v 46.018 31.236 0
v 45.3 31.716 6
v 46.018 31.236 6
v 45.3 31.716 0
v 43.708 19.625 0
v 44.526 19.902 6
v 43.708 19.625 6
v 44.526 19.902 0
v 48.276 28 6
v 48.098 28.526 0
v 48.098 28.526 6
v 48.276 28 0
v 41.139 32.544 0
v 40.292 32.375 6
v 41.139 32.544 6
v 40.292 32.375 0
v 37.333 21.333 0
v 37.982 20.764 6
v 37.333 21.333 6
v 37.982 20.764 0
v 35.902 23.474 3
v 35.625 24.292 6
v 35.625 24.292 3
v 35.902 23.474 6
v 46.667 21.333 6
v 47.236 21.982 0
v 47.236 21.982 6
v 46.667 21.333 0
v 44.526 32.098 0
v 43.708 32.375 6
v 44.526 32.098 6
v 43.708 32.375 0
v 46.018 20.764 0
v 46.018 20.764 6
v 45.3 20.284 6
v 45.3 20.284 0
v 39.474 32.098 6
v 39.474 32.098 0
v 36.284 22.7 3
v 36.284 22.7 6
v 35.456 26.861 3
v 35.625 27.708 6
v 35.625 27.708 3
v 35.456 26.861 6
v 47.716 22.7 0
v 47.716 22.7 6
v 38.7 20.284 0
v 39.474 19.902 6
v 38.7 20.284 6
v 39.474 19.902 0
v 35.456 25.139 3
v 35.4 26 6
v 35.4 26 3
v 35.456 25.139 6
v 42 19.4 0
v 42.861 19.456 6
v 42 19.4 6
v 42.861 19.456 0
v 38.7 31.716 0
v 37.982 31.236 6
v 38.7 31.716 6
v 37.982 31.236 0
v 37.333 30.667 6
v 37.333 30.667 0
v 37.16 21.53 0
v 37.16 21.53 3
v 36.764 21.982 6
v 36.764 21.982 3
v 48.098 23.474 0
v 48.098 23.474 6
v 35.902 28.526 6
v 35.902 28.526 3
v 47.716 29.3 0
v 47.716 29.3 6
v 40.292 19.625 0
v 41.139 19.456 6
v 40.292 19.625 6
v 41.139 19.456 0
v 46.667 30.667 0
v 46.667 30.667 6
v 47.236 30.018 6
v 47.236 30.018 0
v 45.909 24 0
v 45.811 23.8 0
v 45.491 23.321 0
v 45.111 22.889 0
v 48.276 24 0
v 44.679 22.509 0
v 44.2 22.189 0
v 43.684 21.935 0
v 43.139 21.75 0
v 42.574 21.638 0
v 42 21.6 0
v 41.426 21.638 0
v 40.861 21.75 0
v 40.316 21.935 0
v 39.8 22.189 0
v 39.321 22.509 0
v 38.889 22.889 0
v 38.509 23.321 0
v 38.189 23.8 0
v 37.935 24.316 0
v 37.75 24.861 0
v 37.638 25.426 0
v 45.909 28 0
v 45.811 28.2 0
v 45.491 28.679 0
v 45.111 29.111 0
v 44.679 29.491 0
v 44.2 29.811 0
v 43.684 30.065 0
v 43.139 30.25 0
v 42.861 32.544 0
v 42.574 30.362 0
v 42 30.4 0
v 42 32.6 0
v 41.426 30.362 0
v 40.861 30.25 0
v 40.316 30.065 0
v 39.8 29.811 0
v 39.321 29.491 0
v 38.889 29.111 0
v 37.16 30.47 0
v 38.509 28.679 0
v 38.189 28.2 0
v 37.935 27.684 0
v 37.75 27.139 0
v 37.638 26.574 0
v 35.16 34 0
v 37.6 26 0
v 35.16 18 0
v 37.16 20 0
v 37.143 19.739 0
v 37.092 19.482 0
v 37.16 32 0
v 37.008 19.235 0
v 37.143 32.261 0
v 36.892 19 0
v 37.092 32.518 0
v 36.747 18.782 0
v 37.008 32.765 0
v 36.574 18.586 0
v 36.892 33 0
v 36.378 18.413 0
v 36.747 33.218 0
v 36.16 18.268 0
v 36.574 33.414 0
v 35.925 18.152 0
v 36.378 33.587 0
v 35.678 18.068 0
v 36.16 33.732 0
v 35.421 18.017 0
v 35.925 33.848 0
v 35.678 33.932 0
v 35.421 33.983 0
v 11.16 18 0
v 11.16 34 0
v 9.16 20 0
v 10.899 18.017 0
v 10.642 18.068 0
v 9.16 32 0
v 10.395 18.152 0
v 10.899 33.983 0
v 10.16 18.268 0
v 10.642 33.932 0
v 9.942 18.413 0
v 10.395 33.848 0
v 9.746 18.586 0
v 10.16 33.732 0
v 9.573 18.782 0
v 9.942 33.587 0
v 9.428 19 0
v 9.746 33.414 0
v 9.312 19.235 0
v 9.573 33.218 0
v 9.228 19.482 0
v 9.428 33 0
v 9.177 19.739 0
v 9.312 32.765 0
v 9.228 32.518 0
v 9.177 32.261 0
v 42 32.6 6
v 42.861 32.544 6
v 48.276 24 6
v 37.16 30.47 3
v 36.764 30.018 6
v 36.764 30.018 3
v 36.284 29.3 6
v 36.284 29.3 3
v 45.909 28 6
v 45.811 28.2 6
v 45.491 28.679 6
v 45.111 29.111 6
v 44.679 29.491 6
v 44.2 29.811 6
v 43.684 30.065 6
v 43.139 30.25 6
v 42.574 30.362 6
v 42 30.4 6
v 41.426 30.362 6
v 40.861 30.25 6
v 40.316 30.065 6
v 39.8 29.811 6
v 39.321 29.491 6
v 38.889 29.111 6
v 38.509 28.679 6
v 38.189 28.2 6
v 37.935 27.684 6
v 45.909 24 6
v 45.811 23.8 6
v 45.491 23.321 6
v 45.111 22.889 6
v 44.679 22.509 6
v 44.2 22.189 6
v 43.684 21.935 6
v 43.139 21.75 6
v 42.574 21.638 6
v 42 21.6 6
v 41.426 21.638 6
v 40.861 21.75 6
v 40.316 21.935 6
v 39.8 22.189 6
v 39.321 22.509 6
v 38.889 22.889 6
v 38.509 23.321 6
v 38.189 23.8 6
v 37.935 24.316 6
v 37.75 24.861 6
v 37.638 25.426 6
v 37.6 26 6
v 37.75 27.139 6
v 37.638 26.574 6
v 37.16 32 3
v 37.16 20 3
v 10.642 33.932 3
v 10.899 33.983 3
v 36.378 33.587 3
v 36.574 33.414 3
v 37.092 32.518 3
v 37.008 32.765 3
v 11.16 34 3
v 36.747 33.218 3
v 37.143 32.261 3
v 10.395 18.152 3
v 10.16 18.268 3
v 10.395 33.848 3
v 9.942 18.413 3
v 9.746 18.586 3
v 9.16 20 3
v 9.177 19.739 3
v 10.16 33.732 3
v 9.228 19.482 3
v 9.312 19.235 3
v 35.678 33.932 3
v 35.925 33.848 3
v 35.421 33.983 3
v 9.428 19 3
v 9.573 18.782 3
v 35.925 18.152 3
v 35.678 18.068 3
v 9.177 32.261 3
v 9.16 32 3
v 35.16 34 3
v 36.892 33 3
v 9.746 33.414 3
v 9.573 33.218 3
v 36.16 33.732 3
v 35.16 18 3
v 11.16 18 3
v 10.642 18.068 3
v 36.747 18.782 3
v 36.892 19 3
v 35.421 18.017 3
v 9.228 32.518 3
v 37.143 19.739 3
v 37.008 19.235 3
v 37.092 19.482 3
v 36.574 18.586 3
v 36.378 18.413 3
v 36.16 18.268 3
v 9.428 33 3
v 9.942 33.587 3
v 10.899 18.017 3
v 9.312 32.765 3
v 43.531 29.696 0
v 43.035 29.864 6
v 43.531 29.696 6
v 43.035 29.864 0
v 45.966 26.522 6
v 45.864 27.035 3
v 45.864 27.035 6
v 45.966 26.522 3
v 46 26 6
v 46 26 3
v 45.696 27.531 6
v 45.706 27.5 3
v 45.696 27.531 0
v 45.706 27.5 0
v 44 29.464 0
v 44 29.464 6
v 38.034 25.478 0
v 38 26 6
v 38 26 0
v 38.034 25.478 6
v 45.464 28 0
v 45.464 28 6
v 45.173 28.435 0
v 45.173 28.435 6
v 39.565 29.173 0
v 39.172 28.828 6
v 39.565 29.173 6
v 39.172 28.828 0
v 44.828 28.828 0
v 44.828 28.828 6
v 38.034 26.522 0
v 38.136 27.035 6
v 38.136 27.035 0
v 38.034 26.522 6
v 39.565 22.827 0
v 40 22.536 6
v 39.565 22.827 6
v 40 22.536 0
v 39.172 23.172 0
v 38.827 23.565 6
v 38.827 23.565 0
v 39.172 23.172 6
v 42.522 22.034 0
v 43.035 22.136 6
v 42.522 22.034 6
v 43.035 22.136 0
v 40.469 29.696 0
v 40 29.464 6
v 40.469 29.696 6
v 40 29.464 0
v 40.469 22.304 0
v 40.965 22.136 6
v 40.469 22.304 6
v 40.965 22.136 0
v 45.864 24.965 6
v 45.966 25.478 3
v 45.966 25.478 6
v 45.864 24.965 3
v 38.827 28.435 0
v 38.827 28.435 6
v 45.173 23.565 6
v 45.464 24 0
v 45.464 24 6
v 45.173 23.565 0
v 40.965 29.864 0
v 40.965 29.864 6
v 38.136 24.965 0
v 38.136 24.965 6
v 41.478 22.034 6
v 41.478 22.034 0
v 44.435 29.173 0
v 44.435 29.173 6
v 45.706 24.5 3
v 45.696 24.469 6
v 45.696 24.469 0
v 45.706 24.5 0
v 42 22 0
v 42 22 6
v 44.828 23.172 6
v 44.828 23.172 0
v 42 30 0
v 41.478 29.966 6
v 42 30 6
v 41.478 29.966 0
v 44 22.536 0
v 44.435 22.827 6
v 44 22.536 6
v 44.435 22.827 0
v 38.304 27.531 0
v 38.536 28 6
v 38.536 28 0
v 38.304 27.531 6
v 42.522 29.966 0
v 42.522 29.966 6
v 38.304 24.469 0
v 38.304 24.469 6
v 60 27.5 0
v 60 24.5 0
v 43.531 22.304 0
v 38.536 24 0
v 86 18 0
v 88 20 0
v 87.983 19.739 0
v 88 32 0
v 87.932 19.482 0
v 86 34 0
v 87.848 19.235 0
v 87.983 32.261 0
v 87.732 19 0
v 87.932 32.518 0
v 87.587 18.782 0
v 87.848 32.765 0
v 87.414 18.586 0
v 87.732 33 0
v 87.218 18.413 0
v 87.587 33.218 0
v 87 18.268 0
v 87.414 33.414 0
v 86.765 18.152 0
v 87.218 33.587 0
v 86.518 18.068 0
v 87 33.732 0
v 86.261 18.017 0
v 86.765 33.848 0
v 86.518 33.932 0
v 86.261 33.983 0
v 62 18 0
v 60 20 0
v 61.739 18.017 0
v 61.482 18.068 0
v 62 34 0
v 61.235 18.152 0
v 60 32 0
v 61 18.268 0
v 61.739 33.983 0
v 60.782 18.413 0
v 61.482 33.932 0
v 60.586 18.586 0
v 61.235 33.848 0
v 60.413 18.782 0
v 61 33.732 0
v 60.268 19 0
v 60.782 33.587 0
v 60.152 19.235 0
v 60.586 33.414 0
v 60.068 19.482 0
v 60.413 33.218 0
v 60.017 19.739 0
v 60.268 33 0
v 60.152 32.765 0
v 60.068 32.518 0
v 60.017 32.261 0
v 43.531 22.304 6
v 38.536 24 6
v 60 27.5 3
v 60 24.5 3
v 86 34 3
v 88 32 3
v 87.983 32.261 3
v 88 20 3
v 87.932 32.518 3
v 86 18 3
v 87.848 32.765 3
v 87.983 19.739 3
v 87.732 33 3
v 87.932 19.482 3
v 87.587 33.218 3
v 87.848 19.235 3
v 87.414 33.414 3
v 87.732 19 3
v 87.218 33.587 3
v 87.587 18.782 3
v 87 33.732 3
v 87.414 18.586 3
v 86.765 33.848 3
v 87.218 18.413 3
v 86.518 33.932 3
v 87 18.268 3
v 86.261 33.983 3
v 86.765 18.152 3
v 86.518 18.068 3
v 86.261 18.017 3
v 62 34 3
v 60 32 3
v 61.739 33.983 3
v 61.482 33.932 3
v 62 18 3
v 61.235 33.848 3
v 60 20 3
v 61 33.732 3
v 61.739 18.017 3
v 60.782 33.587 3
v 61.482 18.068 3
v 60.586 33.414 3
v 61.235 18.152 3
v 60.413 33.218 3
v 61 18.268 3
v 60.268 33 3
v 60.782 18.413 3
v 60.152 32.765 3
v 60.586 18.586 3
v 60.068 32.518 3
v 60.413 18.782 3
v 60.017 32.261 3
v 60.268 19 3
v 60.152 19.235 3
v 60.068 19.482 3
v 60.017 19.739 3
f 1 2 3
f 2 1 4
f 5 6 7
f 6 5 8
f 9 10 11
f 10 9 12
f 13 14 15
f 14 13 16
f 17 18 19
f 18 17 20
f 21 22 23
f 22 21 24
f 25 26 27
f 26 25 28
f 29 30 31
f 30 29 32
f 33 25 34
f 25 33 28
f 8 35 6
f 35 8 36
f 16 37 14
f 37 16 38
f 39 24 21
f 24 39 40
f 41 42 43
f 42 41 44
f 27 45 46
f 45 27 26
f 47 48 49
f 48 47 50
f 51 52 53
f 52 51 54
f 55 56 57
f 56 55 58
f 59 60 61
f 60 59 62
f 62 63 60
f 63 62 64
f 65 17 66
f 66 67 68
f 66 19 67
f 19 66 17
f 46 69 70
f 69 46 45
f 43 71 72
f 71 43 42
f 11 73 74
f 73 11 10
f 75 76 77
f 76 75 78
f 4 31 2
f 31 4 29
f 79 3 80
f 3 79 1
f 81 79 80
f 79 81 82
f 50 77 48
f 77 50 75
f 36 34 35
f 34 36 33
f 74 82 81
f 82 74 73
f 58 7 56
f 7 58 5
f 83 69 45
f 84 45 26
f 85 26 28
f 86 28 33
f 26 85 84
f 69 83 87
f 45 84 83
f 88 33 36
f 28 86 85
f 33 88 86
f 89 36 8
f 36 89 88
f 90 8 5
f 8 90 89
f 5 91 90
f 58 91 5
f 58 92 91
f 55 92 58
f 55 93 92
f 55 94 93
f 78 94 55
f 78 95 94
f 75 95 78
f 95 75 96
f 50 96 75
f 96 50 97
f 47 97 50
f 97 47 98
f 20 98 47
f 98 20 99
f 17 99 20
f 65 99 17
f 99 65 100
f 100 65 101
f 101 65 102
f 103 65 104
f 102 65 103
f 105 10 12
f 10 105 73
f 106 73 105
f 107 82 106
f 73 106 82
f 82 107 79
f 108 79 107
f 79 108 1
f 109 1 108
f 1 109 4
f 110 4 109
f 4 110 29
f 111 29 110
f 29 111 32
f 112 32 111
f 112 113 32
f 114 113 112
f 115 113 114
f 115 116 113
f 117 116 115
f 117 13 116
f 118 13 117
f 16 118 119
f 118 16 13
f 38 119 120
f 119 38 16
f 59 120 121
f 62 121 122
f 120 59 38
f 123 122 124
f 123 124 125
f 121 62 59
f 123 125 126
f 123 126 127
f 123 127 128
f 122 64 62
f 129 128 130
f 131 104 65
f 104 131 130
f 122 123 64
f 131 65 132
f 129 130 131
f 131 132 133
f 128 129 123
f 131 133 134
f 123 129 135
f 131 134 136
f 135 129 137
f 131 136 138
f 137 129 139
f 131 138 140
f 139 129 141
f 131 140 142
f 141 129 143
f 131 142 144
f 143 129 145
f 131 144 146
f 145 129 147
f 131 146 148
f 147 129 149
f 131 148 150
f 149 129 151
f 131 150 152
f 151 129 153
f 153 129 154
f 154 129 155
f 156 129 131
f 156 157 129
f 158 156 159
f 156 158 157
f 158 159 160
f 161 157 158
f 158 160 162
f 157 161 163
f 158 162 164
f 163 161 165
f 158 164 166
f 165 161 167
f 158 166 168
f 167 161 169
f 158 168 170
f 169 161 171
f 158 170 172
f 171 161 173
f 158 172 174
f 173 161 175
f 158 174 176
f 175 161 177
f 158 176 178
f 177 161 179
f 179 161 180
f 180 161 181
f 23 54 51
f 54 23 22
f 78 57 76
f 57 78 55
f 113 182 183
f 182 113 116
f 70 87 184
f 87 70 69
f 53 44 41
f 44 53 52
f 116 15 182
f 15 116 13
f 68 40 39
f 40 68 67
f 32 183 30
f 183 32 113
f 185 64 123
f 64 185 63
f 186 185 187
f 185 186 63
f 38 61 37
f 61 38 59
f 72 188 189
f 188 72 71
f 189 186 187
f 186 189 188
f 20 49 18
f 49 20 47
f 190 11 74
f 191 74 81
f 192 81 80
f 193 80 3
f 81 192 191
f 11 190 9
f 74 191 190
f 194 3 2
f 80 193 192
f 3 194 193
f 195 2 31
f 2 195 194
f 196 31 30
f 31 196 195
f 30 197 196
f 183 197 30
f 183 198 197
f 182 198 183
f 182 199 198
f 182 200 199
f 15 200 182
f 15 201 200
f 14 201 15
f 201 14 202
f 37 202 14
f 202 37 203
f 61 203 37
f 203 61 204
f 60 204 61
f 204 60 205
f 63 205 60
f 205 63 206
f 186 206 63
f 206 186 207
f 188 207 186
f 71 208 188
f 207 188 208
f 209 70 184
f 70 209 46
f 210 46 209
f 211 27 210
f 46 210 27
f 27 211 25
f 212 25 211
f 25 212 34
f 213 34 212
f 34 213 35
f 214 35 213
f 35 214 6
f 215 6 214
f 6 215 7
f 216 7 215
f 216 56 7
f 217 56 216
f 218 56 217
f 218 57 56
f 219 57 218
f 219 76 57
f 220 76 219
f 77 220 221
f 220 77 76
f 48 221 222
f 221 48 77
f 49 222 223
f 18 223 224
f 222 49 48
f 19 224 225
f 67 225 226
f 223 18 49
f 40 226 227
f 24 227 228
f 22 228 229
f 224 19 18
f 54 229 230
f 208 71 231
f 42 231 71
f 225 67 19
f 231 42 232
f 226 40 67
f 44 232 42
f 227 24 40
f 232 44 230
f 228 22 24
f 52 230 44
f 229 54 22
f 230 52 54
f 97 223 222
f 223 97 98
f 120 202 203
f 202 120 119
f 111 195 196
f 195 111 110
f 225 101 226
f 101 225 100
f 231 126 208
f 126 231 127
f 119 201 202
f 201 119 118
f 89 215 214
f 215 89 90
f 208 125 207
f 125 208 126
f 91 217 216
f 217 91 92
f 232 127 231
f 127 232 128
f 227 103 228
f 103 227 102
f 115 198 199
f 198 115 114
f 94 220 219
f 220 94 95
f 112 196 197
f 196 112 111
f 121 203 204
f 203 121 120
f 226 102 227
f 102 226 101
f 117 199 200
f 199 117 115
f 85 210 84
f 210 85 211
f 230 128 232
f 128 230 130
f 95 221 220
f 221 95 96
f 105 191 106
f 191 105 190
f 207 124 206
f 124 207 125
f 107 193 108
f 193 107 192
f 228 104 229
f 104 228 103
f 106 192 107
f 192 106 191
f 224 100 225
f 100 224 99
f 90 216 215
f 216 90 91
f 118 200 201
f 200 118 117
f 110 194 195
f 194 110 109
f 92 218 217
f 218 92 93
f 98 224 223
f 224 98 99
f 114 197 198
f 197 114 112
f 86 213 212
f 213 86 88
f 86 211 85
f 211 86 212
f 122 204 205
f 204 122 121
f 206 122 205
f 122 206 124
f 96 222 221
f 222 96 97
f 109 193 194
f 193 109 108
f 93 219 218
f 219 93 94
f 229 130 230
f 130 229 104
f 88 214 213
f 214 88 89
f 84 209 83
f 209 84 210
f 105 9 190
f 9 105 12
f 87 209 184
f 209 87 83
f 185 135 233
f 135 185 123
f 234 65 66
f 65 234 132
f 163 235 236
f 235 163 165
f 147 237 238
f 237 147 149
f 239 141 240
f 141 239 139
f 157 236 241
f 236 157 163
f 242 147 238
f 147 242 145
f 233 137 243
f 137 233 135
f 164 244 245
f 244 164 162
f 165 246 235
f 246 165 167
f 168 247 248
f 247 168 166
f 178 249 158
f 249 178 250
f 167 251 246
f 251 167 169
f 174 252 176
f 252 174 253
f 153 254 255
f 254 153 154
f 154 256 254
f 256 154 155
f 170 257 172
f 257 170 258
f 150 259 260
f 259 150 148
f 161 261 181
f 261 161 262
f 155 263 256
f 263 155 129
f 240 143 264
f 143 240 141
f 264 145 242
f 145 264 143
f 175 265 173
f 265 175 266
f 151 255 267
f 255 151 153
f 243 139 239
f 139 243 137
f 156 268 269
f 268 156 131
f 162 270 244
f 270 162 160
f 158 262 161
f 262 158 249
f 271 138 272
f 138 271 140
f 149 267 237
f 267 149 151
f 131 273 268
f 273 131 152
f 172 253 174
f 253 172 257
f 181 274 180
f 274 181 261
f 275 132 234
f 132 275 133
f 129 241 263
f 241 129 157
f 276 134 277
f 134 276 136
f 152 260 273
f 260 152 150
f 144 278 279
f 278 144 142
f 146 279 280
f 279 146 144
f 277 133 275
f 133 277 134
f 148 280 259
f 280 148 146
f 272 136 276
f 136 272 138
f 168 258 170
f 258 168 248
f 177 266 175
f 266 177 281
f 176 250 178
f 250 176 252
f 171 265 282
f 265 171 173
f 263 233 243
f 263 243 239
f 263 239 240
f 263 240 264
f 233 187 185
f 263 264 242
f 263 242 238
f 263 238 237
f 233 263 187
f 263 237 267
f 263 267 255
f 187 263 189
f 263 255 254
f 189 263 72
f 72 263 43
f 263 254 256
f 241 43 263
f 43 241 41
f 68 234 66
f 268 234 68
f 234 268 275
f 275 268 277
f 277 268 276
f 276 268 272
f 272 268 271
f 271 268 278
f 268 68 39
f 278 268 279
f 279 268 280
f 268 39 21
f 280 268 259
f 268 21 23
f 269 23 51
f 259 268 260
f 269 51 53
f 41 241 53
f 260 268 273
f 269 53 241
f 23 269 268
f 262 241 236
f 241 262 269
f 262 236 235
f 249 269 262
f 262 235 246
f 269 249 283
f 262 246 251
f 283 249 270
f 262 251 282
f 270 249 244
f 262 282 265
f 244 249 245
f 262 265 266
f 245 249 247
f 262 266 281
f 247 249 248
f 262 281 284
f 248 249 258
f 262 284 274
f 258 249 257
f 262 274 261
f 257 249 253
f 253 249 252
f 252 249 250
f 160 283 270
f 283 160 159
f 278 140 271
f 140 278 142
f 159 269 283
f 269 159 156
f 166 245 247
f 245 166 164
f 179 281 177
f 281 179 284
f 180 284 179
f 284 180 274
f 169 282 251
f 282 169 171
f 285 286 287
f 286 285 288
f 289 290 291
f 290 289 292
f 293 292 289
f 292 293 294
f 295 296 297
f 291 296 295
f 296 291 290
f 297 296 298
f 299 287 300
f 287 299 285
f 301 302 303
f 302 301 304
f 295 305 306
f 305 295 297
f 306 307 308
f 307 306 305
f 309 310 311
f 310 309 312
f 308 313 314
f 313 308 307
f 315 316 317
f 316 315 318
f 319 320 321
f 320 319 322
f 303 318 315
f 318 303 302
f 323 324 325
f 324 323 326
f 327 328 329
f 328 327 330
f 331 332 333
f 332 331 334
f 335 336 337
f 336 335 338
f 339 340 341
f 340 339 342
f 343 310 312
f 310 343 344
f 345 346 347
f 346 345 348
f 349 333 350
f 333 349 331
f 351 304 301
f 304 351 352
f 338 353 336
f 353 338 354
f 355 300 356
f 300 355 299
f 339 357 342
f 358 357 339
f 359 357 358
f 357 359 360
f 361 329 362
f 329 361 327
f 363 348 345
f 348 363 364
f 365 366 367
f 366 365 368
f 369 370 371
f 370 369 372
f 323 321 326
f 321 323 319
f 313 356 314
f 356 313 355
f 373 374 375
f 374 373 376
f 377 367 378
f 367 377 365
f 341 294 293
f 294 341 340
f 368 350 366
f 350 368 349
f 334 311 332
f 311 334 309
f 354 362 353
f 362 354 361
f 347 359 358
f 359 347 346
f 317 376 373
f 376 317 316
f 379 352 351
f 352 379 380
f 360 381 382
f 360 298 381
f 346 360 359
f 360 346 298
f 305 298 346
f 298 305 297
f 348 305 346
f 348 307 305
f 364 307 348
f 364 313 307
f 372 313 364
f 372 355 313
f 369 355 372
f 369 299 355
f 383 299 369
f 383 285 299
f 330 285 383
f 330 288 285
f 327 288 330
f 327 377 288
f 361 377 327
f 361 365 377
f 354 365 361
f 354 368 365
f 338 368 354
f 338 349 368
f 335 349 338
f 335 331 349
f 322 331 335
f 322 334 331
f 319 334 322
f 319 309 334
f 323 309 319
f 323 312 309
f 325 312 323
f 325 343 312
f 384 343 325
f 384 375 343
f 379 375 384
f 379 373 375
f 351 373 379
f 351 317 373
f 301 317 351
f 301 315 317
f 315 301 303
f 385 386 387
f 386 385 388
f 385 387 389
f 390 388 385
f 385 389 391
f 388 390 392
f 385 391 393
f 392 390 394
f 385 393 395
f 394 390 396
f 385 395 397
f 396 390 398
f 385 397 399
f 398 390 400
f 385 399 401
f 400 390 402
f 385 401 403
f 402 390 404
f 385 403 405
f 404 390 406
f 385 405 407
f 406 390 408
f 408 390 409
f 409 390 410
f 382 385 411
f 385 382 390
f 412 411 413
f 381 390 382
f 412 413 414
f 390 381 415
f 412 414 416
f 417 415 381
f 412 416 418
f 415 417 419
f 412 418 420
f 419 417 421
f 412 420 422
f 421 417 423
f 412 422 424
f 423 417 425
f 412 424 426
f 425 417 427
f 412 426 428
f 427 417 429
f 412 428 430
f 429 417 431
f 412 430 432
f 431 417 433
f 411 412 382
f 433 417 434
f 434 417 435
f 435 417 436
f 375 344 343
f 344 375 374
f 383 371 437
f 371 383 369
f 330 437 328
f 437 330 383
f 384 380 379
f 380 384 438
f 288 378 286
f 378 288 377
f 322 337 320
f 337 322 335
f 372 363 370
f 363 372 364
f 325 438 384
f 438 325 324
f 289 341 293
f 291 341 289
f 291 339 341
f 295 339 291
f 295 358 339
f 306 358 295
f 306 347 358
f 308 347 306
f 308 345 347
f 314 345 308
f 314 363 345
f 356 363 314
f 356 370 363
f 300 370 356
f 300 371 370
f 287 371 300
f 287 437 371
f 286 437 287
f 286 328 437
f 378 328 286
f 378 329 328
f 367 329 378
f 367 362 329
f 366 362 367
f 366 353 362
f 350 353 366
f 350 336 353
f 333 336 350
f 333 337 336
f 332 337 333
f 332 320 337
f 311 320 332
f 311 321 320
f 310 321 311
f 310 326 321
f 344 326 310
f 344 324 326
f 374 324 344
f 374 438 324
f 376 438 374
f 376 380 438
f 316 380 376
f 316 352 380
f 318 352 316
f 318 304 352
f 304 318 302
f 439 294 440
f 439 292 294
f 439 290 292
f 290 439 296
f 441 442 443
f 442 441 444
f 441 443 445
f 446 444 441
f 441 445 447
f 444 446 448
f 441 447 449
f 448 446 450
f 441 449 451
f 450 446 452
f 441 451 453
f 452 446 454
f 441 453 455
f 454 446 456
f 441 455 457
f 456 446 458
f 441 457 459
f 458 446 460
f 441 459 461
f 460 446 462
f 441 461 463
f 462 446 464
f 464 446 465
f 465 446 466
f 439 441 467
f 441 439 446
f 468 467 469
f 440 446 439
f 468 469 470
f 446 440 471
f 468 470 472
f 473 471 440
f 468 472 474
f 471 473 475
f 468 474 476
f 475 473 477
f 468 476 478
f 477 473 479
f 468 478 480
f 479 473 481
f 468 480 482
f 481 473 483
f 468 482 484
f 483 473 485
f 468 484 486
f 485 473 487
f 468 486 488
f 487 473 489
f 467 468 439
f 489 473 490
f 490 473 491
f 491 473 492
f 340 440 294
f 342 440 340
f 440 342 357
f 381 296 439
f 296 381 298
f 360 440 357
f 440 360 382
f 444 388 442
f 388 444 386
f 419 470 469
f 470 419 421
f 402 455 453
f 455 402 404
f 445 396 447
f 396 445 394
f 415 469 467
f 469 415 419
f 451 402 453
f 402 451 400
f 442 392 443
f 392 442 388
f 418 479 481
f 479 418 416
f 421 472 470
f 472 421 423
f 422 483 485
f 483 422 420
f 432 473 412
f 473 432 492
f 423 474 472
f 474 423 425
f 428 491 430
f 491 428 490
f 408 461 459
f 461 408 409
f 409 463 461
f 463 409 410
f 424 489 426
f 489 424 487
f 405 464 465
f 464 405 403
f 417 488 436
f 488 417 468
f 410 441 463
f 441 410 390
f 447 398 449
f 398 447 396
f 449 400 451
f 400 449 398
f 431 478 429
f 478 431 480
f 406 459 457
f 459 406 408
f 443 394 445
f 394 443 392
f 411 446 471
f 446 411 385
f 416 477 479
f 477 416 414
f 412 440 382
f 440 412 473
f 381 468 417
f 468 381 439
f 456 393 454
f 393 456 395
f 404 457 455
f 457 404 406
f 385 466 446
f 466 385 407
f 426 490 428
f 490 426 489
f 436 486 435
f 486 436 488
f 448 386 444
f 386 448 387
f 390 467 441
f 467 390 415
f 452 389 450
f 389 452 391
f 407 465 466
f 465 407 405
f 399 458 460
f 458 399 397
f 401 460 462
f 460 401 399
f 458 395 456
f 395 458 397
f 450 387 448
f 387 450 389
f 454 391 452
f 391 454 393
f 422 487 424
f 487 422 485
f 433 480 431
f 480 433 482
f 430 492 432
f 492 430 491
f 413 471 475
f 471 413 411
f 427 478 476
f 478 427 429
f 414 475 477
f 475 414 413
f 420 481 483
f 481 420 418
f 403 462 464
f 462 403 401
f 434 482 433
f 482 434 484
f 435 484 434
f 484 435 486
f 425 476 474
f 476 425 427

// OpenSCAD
/*
Sample 008: Print-in-Place-Flachdrehgelenk — 0,40 mm
Generated from the FDM Mechanical Sample Library.
Units: millimetres.

Override examples:
  openscad -o custom.stl -D 'view="plate"' -D 'render_fn=64' model.scad
  openscad -o preview.png -D 'view="assembly"' model.scad
*/
use <../../../library/fdm_mechanisms.scad>

render_fn = is_undef(render_fn) ? 48 : render_fn;
view = is_undef(view) ? "plate" : view;
$fn = render_fn;

sample_pip_pivot(
    view=view,
    clearance=0.4,
    core_d=8
);
